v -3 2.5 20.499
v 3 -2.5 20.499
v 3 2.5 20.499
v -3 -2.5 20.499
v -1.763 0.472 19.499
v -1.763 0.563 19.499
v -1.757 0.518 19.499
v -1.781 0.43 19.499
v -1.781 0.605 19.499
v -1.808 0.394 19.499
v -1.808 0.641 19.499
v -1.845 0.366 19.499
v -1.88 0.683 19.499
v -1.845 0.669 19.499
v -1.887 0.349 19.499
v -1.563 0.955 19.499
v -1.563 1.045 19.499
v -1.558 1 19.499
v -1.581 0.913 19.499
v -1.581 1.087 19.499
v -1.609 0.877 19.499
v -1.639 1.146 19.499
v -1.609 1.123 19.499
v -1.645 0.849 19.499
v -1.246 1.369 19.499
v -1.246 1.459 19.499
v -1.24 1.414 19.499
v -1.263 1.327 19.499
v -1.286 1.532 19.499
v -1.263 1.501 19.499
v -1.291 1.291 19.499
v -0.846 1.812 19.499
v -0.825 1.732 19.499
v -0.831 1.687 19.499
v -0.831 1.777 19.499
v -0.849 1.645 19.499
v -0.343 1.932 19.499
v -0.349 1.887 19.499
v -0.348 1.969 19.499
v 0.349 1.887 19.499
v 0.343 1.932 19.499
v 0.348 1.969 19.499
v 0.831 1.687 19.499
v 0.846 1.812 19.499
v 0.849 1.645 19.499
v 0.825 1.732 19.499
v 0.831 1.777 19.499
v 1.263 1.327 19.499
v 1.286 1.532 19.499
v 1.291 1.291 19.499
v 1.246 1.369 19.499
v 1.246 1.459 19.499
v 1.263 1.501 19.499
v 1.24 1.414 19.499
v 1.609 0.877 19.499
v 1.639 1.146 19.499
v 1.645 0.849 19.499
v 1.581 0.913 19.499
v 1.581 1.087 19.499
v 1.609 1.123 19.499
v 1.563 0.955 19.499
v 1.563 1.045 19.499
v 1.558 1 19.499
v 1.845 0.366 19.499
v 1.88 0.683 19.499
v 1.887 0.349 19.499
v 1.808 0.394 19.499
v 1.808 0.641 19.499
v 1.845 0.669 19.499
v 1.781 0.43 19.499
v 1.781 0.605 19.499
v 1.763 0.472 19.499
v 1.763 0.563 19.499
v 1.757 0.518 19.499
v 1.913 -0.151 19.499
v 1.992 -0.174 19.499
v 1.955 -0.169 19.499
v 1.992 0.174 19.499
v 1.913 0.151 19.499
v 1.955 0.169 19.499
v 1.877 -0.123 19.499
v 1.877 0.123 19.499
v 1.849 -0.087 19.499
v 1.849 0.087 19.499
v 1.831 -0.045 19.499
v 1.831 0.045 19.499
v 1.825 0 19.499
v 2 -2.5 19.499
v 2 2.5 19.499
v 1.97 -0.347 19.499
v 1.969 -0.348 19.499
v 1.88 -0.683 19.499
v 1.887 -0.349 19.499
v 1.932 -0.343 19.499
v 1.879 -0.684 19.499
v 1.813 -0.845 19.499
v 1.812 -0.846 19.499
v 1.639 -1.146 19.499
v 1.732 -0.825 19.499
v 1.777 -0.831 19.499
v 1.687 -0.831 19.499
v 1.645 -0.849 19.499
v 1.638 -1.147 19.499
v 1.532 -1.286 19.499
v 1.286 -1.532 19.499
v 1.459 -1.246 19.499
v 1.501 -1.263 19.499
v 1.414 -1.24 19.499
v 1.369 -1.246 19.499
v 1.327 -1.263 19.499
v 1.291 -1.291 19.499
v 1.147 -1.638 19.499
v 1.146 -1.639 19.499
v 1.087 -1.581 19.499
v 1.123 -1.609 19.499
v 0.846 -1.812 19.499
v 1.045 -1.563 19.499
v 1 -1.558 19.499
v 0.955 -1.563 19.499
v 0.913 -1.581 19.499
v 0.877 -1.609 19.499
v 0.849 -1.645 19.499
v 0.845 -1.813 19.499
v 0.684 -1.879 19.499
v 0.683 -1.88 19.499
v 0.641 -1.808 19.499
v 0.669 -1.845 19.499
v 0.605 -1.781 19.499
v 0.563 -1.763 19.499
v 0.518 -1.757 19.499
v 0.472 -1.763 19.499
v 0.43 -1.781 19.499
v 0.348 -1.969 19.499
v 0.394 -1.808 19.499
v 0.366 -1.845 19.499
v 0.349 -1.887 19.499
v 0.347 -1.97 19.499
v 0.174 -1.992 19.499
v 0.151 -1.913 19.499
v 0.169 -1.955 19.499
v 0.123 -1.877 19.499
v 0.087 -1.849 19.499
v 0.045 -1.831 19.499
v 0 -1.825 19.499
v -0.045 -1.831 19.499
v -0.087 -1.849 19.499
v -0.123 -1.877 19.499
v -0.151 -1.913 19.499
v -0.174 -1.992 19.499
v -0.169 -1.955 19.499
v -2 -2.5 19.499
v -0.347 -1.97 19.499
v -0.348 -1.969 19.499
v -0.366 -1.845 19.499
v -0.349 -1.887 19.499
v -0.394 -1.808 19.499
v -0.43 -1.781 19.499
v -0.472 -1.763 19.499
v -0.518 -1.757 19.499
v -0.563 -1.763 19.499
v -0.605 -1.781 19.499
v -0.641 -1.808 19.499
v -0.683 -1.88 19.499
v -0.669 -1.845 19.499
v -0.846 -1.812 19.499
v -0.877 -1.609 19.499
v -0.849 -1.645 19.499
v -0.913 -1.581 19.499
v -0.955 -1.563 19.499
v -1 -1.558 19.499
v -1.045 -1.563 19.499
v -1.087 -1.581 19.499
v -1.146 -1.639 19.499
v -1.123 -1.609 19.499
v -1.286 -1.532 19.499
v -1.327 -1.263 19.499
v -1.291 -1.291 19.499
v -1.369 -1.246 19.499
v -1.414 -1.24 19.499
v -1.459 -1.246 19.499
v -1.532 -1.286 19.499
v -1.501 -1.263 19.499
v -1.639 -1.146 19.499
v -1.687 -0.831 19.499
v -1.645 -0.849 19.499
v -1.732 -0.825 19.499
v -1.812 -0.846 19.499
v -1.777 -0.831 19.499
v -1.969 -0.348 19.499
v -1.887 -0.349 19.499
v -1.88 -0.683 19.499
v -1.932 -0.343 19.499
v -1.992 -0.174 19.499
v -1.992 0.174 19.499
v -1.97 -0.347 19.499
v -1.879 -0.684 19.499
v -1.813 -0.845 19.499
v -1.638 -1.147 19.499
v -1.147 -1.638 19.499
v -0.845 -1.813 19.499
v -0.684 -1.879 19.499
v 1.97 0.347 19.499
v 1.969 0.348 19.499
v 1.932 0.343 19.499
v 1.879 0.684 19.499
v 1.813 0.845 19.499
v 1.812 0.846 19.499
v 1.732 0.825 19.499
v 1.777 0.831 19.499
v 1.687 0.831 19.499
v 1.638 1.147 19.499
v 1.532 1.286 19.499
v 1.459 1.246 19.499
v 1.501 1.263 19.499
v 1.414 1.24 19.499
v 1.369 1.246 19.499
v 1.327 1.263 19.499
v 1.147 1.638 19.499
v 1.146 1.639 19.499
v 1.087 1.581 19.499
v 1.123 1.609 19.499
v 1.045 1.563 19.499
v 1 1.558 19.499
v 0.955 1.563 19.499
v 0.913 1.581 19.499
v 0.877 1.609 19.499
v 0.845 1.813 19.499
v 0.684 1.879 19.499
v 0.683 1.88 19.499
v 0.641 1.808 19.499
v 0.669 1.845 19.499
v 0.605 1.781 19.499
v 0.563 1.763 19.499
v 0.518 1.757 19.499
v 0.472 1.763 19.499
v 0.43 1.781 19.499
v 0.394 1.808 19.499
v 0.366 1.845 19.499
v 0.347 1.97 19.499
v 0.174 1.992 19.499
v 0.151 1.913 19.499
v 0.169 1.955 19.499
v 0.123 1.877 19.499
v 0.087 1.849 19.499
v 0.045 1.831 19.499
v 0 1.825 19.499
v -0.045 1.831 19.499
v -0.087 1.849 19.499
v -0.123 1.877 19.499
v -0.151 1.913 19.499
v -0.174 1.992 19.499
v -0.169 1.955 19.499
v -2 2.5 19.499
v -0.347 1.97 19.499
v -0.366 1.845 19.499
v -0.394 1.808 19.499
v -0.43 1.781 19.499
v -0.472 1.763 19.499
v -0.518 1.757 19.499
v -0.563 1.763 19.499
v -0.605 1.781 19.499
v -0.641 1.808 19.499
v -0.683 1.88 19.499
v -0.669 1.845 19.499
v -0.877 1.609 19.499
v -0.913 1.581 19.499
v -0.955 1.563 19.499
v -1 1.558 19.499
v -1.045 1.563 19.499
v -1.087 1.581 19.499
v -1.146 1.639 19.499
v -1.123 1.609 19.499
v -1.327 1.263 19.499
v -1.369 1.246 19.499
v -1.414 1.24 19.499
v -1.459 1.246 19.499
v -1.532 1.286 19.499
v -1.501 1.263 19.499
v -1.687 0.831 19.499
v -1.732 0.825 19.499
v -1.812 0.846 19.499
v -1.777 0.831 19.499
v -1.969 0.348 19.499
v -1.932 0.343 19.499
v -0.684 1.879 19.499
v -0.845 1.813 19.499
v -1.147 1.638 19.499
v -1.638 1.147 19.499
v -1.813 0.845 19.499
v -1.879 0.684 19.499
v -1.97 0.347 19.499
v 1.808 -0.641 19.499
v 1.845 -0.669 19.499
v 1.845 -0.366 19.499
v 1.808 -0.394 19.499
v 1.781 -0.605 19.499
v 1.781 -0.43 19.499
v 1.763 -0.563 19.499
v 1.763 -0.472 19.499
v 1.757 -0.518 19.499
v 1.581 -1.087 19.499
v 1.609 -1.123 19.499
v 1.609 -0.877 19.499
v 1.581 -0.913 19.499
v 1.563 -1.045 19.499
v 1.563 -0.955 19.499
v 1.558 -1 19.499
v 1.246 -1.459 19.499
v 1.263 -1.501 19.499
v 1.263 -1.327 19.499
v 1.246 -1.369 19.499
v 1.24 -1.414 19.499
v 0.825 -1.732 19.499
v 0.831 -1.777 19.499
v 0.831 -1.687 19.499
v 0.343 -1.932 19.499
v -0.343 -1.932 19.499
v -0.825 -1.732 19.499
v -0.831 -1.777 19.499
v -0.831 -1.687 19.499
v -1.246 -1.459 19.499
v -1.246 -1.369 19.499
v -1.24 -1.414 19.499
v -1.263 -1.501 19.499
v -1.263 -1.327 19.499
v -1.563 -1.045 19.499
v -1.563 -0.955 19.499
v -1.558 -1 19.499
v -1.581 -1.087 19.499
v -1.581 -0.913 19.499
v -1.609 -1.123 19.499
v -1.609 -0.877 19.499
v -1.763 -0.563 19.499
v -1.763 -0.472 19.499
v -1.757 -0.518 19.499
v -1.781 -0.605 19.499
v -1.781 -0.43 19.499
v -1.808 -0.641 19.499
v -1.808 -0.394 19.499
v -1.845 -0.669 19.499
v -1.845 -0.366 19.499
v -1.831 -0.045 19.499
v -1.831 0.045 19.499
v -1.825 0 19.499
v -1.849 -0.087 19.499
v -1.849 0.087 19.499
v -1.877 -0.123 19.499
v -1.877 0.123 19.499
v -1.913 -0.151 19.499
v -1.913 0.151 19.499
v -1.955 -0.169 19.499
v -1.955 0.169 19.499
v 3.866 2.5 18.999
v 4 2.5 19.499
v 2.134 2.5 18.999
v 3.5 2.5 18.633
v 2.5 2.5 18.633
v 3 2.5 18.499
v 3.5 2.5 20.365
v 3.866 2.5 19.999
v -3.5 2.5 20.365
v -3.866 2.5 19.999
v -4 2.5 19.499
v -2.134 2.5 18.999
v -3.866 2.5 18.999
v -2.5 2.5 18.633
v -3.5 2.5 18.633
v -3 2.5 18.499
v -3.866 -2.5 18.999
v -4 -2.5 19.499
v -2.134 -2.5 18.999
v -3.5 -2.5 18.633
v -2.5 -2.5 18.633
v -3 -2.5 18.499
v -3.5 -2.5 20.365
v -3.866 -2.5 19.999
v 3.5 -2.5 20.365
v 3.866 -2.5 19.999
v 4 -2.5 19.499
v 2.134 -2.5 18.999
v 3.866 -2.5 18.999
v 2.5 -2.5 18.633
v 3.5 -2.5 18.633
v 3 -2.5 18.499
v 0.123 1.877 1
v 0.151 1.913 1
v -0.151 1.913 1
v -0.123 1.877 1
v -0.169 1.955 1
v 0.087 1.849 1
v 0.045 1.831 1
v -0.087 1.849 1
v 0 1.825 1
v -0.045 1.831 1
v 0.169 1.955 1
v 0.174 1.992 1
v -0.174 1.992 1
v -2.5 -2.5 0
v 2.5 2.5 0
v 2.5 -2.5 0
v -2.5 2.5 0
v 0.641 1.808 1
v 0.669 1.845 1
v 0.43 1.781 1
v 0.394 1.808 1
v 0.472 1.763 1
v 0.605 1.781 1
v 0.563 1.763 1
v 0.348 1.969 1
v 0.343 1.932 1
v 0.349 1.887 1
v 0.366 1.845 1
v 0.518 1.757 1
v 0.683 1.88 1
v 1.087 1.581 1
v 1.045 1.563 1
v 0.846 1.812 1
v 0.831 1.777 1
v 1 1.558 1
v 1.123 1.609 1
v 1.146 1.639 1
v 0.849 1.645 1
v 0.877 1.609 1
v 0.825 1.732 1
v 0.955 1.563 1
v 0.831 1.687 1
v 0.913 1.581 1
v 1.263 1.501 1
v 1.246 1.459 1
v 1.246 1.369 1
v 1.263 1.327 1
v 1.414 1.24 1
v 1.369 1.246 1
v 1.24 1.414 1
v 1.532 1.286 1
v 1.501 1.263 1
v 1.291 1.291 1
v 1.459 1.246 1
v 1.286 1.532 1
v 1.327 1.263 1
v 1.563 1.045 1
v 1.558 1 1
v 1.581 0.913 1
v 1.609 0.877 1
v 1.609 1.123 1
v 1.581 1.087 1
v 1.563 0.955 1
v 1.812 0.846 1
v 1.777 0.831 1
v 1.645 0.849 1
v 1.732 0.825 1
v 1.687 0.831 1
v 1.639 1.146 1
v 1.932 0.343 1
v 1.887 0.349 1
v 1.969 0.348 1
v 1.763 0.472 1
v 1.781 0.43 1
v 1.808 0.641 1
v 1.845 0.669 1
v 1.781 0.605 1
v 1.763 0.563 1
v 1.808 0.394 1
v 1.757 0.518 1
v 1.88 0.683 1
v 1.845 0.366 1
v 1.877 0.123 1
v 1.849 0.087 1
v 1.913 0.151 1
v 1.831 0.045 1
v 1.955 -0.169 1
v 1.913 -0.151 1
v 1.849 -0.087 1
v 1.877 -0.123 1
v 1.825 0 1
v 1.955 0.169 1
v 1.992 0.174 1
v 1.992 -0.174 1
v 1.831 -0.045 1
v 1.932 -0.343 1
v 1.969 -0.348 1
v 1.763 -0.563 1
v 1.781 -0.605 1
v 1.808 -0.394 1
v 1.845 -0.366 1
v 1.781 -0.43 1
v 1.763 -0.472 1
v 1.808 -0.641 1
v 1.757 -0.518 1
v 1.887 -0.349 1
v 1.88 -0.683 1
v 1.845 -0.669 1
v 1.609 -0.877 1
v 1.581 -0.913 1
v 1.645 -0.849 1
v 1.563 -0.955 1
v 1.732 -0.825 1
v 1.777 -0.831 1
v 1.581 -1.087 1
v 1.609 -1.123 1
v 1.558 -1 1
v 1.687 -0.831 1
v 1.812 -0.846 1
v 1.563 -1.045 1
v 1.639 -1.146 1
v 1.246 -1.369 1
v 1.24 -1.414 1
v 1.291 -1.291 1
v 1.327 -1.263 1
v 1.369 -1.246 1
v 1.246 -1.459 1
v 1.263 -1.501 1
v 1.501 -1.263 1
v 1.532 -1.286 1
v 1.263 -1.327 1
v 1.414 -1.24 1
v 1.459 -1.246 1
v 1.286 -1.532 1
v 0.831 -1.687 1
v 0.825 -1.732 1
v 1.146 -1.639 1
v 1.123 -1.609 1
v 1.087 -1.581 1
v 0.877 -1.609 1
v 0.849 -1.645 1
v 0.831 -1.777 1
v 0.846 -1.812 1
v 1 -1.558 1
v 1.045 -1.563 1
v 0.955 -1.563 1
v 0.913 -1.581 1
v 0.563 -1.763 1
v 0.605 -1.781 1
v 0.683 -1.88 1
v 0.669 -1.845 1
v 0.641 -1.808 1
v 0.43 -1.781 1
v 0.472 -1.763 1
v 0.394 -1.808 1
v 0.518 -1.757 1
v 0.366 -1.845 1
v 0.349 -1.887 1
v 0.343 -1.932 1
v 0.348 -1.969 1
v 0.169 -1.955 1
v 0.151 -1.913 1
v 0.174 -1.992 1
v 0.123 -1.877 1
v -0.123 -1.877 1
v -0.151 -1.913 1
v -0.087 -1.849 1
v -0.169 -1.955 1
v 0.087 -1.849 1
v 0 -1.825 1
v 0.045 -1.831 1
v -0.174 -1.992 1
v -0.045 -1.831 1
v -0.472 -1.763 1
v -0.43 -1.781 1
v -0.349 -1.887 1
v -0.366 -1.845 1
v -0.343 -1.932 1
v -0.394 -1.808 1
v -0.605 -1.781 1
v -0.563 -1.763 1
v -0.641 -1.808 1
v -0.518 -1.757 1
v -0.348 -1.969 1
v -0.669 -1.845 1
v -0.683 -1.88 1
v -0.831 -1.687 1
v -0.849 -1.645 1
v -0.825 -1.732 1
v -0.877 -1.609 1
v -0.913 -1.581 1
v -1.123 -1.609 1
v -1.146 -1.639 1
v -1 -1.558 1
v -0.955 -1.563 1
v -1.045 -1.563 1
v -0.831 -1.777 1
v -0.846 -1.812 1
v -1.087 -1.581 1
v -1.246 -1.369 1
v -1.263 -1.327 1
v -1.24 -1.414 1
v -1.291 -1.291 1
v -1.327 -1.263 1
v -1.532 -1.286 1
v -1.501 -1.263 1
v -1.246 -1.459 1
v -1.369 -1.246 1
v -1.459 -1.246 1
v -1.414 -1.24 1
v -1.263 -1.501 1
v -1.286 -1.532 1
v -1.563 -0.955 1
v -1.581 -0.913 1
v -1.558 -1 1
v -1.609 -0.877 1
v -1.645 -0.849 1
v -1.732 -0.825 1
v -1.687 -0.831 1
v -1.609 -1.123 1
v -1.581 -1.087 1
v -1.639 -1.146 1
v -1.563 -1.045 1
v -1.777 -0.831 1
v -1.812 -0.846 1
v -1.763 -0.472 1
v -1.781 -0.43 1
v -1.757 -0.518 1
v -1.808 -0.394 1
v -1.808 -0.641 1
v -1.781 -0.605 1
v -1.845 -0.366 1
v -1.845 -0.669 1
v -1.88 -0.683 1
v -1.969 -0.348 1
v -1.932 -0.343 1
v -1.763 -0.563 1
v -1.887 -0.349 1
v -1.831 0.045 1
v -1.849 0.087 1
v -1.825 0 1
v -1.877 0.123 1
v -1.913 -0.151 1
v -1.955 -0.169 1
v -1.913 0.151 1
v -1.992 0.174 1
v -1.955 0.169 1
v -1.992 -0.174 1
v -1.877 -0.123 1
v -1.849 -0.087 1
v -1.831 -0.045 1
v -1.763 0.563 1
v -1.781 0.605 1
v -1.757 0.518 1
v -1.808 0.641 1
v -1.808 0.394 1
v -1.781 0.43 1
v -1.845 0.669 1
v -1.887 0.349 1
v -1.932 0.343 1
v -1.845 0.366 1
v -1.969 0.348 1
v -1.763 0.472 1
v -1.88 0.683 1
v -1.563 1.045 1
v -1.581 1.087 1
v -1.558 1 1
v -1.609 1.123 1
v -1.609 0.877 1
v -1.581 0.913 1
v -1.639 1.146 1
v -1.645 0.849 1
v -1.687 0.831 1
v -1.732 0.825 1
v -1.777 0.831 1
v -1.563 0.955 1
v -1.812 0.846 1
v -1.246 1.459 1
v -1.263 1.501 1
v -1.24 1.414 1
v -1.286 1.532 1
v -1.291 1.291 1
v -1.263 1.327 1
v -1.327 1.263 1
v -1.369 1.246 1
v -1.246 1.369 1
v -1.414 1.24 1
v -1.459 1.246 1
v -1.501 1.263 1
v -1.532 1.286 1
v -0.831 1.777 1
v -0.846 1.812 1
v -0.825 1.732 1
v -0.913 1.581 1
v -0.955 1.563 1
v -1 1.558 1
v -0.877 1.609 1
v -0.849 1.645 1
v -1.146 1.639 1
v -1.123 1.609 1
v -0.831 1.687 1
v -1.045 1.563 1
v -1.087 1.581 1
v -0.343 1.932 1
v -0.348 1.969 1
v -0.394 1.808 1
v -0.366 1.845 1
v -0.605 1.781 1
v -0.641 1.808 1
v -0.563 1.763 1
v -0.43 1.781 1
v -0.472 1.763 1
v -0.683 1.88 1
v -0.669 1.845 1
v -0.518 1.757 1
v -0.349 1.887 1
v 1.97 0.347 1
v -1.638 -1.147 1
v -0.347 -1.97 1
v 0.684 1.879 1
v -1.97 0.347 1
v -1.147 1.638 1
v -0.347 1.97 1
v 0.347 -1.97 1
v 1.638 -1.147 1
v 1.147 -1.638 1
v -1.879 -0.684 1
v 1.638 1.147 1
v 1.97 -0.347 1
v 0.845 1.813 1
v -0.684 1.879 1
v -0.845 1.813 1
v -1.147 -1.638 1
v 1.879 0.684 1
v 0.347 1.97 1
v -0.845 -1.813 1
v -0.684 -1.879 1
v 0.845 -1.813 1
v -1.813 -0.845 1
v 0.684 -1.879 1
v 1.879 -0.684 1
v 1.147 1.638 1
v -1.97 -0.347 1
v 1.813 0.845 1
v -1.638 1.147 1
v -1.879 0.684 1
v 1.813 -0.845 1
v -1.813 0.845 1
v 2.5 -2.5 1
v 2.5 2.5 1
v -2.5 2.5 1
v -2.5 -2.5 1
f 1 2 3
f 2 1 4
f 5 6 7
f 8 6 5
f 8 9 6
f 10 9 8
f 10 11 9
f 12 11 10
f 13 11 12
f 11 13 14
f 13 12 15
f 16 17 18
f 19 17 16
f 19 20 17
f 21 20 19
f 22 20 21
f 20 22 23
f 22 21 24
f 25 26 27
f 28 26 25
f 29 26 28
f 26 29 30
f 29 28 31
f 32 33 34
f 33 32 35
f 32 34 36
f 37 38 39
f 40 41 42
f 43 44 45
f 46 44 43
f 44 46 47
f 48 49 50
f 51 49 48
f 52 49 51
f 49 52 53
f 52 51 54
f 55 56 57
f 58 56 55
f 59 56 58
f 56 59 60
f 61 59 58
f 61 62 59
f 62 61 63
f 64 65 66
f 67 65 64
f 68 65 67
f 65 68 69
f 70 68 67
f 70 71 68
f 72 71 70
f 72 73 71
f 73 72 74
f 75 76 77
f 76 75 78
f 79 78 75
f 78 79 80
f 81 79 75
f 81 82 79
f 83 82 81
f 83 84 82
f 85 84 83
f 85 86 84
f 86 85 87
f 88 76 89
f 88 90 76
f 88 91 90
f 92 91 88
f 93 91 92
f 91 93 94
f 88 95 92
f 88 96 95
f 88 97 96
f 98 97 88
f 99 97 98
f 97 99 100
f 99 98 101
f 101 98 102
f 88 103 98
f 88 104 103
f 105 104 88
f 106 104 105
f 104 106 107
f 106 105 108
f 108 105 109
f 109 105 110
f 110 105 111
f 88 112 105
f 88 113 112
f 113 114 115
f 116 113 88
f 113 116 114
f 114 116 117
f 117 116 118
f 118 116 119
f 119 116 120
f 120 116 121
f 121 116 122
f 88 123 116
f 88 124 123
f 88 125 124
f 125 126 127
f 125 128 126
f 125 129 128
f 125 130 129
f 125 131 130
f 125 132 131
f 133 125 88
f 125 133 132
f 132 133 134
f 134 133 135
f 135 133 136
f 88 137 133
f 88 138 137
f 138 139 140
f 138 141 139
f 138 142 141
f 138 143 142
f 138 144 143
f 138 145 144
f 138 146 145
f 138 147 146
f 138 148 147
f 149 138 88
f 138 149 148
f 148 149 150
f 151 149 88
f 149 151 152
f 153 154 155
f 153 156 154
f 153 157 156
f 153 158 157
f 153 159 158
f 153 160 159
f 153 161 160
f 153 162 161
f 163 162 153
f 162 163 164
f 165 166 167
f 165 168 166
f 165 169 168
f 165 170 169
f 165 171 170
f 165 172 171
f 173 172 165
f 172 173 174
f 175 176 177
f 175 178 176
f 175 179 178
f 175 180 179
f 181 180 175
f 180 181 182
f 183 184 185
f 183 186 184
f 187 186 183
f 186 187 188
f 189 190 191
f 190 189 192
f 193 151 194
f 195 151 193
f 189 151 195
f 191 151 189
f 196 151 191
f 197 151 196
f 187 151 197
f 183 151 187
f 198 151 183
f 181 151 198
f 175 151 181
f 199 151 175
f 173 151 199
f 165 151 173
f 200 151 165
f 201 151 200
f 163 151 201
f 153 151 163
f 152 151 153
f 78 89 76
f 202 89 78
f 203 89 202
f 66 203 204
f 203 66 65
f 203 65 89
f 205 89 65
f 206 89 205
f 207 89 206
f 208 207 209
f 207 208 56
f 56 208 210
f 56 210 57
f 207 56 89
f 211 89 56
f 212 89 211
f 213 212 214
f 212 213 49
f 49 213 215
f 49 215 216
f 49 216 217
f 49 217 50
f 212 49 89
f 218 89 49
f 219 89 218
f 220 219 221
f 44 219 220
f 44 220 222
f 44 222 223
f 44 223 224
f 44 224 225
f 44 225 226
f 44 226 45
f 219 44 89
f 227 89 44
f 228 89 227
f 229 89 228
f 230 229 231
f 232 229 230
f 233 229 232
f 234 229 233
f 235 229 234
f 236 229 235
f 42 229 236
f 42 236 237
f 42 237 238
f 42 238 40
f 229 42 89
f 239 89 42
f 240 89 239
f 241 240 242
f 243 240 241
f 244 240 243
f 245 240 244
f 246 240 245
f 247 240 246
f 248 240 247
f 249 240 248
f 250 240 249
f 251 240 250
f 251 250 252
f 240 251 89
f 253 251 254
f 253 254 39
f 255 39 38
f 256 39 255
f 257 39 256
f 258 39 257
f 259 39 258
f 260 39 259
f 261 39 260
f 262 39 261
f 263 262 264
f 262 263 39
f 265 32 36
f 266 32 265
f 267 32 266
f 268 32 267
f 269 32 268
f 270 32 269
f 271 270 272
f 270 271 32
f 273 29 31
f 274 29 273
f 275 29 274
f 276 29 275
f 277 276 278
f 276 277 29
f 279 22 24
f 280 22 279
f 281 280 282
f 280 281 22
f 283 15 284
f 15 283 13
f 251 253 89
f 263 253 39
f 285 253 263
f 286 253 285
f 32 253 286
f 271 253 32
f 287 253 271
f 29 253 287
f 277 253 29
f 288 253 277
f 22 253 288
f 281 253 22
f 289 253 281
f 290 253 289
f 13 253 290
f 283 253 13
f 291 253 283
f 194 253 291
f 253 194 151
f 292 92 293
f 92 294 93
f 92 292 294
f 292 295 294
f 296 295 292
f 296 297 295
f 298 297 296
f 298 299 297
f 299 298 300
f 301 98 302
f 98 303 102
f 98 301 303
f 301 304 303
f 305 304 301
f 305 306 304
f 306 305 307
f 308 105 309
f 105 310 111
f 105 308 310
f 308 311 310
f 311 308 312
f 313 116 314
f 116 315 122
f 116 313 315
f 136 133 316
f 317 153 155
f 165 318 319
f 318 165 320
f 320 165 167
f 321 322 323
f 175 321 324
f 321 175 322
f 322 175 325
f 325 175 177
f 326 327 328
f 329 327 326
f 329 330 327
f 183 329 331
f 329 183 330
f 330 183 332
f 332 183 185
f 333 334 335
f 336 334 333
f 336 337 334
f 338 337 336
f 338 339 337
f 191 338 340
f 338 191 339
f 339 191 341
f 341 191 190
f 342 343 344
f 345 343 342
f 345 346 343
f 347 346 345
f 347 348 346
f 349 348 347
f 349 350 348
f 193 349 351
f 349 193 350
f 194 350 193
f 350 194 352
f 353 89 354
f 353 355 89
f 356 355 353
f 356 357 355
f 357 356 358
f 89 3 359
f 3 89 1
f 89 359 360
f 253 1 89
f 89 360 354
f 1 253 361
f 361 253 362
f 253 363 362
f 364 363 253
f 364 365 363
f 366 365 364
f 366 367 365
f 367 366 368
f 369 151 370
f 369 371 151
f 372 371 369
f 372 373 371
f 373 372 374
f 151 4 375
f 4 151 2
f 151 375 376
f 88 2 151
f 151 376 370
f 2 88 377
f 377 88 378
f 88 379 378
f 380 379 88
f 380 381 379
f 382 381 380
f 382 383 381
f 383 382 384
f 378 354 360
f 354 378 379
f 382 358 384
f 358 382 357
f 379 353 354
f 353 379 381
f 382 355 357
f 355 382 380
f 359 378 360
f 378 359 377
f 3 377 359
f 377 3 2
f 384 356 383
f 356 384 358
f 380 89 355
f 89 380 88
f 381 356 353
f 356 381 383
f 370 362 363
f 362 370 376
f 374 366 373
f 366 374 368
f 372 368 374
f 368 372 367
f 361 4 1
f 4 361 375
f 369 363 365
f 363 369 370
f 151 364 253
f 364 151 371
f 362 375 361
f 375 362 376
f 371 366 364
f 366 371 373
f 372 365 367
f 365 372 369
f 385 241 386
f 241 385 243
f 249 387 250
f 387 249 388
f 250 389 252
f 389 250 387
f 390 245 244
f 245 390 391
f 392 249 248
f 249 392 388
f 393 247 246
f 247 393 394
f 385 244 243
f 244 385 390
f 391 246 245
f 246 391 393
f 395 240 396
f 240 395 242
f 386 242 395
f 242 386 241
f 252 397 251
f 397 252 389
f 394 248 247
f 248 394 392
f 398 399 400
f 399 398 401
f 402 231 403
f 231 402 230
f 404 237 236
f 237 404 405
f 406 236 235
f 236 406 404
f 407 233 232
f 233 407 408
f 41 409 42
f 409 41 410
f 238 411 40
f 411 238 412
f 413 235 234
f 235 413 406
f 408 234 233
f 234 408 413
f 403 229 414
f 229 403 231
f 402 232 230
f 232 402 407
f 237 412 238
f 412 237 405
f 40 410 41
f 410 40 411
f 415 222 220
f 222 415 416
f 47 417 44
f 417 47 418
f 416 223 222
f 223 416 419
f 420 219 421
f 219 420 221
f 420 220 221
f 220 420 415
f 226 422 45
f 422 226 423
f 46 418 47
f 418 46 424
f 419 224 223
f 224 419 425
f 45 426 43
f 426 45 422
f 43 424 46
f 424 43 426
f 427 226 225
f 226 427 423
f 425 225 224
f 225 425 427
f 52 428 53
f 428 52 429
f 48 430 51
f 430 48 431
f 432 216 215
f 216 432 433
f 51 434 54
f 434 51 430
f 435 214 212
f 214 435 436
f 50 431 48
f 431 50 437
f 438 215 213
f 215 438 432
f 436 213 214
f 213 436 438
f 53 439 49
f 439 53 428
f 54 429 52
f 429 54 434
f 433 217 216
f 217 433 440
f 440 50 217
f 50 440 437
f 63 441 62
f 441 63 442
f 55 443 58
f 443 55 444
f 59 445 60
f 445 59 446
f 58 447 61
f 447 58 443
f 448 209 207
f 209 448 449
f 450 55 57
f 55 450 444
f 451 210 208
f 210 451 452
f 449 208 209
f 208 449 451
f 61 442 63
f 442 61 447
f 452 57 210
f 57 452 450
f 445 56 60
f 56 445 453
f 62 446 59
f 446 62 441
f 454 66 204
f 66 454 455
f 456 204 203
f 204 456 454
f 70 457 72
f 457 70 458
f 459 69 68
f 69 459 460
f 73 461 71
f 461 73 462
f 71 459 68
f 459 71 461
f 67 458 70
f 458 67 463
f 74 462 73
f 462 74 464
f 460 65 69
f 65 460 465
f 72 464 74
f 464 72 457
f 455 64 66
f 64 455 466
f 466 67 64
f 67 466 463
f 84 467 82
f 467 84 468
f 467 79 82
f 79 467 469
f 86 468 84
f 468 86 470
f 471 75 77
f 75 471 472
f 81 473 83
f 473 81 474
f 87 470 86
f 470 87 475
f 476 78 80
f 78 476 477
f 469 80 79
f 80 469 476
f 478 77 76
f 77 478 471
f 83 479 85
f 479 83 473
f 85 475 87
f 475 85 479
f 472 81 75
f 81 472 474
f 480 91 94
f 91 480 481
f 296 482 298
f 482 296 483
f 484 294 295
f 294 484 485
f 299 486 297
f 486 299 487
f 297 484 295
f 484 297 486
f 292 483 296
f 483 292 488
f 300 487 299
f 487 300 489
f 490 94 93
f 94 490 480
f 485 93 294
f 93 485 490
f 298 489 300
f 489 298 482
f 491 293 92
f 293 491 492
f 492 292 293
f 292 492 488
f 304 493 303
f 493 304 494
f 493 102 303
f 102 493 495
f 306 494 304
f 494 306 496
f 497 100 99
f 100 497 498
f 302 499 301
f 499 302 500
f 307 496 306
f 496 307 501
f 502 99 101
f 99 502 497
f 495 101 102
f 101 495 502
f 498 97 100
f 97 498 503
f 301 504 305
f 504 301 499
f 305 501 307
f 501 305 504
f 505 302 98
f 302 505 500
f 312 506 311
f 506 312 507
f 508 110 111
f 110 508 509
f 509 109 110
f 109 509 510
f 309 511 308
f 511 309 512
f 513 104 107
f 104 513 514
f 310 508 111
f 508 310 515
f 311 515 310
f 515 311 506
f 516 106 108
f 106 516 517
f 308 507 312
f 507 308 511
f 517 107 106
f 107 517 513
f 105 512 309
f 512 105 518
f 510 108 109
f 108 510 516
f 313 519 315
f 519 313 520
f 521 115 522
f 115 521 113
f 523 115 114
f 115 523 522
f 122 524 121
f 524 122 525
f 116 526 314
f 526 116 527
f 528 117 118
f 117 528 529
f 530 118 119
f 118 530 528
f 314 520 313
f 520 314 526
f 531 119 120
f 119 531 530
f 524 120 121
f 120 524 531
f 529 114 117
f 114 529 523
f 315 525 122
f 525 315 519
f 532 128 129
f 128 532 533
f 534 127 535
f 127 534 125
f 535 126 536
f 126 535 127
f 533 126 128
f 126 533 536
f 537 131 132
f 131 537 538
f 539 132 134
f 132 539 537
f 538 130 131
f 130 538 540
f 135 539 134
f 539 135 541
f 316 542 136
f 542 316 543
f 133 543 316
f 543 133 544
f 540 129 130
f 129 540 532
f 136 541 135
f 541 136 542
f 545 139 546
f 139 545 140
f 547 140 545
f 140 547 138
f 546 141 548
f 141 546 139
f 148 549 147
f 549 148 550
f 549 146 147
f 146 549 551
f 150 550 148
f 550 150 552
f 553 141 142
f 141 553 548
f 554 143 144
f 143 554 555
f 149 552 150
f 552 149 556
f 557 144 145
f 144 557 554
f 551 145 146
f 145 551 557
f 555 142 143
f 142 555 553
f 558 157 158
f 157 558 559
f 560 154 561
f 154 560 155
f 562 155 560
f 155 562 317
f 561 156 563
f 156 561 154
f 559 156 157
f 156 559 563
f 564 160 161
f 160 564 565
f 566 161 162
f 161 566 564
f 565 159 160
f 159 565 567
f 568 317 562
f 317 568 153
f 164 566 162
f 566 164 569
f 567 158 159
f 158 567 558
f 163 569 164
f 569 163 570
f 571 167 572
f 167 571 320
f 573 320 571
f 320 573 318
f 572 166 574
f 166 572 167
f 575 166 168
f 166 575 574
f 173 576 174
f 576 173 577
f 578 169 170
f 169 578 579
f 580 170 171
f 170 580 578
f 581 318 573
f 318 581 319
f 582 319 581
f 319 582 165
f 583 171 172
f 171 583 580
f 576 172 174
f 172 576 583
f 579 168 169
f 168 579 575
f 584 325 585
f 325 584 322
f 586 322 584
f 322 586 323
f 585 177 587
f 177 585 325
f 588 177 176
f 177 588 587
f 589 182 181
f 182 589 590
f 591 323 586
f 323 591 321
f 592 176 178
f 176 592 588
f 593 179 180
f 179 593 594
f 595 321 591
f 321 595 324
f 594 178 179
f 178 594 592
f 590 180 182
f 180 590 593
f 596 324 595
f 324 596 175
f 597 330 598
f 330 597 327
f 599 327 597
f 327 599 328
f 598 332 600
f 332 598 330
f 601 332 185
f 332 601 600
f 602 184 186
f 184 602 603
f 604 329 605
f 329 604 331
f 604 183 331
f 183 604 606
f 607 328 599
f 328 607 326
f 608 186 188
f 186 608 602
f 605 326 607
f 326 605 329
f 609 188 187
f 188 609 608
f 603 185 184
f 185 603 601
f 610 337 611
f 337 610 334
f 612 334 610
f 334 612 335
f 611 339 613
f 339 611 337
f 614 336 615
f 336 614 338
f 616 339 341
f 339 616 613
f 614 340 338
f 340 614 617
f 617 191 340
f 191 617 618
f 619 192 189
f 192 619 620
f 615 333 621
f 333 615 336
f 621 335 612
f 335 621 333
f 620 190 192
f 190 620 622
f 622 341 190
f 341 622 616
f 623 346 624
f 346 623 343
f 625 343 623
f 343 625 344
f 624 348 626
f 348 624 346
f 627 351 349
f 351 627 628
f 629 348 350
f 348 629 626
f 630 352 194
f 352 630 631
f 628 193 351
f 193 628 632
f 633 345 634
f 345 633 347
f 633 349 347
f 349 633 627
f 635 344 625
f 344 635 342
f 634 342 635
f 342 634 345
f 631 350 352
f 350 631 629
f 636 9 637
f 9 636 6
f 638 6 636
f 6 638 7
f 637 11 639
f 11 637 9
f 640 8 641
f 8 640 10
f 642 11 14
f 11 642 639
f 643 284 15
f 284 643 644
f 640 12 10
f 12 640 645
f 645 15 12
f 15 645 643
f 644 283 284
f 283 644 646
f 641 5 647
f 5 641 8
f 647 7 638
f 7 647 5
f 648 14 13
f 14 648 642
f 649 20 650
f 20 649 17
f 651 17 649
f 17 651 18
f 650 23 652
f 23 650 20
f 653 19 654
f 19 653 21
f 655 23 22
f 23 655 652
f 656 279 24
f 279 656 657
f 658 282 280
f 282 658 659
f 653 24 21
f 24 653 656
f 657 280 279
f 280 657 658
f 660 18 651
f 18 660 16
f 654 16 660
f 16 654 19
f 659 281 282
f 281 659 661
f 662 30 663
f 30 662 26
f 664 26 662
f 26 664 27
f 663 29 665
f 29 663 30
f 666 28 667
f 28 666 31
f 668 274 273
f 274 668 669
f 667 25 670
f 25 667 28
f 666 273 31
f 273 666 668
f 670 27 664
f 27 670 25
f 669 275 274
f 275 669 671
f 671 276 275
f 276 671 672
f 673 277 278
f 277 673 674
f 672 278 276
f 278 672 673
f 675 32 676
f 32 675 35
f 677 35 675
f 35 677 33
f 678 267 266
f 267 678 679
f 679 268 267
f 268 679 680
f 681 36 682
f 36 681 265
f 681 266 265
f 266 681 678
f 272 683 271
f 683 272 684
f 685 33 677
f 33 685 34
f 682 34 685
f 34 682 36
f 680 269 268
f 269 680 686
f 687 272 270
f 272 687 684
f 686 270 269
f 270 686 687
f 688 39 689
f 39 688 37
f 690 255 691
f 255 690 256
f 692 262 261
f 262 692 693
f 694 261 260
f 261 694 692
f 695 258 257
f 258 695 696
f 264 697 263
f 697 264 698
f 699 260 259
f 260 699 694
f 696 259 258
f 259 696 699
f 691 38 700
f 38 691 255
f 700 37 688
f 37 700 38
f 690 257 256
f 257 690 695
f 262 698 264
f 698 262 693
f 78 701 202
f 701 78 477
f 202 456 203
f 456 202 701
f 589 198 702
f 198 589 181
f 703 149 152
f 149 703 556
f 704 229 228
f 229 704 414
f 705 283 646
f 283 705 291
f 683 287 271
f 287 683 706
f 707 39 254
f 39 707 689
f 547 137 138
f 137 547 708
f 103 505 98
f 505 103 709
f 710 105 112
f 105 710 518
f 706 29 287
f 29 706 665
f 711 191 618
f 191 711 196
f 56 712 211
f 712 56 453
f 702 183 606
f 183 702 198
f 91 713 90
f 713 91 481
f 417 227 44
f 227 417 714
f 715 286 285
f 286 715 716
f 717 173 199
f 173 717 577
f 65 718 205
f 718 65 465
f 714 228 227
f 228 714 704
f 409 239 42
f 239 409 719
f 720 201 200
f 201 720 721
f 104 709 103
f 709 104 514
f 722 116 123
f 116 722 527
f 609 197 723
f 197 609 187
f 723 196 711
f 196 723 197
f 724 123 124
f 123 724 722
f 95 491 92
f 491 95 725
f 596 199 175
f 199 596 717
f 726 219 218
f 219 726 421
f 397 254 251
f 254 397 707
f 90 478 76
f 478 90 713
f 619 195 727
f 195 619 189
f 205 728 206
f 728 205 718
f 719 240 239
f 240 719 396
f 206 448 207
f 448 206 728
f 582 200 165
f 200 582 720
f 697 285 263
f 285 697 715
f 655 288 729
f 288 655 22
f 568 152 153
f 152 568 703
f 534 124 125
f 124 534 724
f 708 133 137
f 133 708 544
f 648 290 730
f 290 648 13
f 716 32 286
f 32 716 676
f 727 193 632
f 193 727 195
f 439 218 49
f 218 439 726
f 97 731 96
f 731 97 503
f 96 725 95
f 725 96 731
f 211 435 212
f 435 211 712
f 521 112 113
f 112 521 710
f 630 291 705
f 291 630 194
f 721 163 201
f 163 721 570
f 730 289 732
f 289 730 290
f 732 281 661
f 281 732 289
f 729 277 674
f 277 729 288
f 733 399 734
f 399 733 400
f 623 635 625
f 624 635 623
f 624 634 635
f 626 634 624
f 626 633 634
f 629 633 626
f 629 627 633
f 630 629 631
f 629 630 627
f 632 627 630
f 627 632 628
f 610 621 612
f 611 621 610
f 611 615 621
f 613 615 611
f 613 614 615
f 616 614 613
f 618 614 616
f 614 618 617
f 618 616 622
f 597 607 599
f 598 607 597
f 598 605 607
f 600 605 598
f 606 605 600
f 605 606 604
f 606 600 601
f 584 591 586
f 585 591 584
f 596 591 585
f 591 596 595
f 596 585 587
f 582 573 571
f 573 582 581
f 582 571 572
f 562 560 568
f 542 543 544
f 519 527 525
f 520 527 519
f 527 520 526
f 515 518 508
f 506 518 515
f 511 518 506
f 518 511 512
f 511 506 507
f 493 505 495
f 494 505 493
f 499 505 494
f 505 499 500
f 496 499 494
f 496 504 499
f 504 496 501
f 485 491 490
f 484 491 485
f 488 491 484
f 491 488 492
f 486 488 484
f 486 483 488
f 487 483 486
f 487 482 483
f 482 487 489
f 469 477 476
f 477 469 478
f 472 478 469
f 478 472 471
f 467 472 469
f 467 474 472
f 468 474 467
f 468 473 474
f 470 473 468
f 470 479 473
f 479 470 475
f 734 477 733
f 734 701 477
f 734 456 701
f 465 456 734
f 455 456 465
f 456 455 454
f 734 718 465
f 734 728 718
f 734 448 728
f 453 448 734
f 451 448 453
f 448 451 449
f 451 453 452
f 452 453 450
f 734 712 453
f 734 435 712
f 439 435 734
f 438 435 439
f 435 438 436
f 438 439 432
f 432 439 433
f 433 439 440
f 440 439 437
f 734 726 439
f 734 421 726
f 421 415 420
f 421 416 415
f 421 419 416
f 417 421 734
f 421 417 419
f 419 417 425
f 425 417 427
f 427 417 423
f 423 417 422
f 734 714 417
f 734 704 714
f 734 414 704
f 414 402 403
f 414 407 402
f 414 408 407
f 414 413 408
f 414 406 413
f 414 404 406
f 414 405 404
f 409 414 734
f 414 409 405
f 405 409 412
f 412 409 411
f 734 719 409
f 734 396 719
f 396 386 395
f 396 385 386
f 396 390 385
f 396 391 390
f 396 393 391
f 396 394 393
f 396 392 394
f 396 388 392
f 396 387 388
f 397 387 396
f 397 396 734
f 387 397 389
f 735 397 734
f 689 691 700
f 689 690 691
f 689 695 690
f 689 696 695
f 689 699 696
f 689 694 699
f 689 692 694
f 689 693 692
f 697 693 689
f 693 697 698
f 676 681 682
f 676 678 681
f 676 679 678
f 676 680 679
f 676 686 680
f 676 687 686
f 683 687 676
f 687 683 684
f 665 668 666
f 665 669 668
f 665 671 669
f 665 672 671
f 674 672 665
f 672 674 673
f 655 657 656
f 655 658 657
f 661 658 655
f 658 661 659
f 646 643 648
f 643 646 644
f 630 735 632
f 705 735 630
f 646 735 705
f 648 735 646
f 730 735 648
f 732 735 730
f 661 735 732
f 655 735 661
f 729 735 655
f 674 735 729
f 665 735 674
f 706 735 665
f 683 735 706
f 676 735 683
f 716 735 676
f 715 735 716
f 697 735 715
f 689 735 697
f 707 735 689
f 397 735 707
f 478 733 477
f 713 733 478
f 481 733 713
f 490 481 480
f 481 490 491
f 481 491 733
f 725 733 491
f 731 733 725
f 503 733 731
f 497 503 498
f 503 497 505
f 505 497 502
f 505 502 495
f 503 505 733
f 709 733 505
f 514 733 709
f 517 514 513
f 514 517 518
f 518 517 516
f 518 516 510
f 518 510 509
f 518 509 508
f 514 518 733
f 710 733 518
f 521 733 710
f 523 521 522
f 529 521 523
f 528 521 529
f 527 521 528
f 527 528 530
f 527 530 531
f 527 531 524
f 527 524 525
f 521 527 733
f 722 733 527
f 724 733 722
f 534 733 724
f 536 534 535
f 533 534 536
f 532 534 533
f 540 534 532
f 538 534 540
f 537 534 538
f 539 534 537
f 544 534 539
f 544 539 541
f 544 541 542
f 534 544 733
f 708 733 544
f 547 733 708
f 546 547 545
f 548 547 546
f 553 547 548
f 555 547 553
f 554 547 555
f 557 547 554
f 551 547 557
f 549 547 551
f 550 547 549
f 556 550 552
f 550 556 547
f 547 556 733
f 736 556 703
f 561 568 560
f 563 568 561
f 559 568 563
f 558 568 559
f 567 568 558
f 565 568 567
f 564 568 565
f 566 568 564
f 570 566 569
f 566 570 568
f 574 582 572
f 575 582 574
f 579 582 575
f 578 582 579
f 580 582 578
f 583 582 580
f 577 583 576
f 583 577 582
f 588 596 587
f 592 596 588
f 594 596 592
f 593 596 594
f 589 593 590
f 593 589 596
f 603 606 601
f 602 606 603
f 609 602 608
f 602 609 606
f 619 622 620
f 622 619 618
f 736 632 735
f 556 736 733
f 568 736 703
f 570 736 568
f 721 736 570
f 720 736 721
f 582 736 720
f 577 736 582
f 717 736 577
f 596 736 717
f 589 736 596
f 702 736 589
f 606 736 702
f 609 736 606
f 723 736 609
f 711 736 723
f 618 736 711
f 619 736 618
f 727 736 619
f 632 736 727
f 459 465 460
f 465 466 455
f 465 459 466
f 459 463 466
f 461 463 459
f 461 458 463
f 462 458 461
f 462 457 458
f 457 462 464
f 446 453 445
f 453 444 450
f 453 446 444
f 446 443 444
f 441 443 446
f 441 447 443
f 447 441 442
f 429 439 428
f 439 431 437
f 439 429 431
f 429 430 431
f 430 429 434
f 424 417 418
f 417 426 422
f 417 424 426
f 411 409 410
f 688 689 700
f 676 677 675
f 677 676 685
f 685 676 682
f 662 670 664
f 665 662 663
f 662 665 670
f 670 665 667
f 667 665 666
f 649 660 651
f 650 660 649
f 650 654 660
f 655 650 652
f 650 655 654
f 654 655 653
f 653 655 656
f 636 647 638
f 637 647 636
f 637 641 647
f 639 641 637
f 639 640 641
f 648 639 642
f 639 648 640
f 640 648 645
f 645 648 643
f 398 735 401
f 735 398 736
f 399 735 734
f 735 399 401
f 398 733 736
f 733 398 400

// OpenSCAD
//Customizable Column v1.2
//v1.2 Customizer fix, added ionic capital
//v1.0 had 10 downloads
//v1.1 had 381 downloads
//Created by Ari M. Diacou, October 2014
//Shared under Creative Commons License: Attribution-ShareAlike 3.0 Unported (CC BY-SA 3.0) 
//see http://creativecommons.org/licenses/by-sa/3.0/


//The ratio of the height to the width of the column
ratio=5;
//The length of the column including the base and capital
height=20;
//Stripes that go up the column
fluting="roman";//[roman,greek,none]
capital="ionic";//[corinthian,simple,ionic]


						/*[Hidden]*/
///////////////// Variables //////////////////////////
pi=3.1415+0;
ep=0.001+0;
width=height/ratio;
capital_height=(capital=="corinthian")
				  ? width*1.3 
				  : width*0.25;
//types=["tuscan","doric","ionic","corinthian"]+0;
//chosen_type="tuscan";//["tuscan","doric","ionic","corinthian"]+0;
//x=search(chosen_type,types)+0;
//echo(x);

////////////////// Main() ///////////////////////////
column();
//////////////// Functions ////////////////////////////
module column(){
	bottom();
	top();
	shaft();
	}

module top(){
	translate([0,0,height-ep]){
        if(capital=="corinthian"){
            corinthian_capital();}
        if(capital=="ionic"){
            ionic_capital();}
        if(capital=="simple"){
            cube([width*1.25,width*1.25,width*0.25],center=true);}
        }
	}

module bottom(){
	translate([0,0,width*0.125]) 
		cube([width*1.25,width*1.25,width*0.25],center=true);
	}

module shaft(){
	difference(){
		cylinder(h=height, r=width/2,$fn=72);
		if(fluting=="greek" || fluting=="roman"){
			for(i=[0:23]){
				translate((width/2)*[sin((360/24)*i),cos((360/24)*i),0])
					cylinder(h=height, 
								r=(fluting=="greek")? (pi*width/2/24):(pi*width/2/36),
								$fn=24);
				}
			}
		}
	}

module ionic_capital(){
    x=width*0.5+capital_height;
    y=width*.625;
    z=-0.5*capital_height;
    cube([width+2*capital_height,width*1.25,capital_height],center=true);
    translate([x,y,z])
        rotate([90,0,0])
            cylinder(h=width*1.25,d=capital_height*2,$fn=12);
    translate([-x,y,z])
        rotate([90,0,0])
            cylinder(h=width*1.25,d=capital_height*2,$fn=12);
    }
module corinthian_capital(){
    z=capital_height;
	ep=.001;
	resize([1.2*z,1.2*z,z])
	translate([0,0,-4])
	union(){
		difference(){
			for(i=[1:12]){
				rotate([0,0,(i+0.0)*30]) petal(3);
				rotate([0,0,(i+0.5)*45]) petal2(3);
				rotate([0,0,(i+0.5)*90]) petal3(3);
				}
			cube([16,16,8],center=true);
			}
		translate([0,0,7+6+.5-ep]) cube([12,12,1],center=true);
		}
	}
module petal(x){
	translate([0,-x,0])
	linear_extrude(height = 7, center = false, convexity = 10, scale=[1,2], $fn=24)
		translate([0, x, 0])
			circle(r = 1.5);
	}

module petal2(x){
	translate([0,-x,3])
	linear_extrude(height = 7, center = false, convexity = 10, scale=[1,2], $fn=24)
		translate([0, x, 0])
			circle(r = 1.5);
	}

module petal3(x){
	translate([0,-x,6])
	linear_extrude(height = 7, center = false, convexity = 10, scale=[1,1.98], $fn=24)
		translate([0, x, 0])
			circle(r = 2.5);
	}
